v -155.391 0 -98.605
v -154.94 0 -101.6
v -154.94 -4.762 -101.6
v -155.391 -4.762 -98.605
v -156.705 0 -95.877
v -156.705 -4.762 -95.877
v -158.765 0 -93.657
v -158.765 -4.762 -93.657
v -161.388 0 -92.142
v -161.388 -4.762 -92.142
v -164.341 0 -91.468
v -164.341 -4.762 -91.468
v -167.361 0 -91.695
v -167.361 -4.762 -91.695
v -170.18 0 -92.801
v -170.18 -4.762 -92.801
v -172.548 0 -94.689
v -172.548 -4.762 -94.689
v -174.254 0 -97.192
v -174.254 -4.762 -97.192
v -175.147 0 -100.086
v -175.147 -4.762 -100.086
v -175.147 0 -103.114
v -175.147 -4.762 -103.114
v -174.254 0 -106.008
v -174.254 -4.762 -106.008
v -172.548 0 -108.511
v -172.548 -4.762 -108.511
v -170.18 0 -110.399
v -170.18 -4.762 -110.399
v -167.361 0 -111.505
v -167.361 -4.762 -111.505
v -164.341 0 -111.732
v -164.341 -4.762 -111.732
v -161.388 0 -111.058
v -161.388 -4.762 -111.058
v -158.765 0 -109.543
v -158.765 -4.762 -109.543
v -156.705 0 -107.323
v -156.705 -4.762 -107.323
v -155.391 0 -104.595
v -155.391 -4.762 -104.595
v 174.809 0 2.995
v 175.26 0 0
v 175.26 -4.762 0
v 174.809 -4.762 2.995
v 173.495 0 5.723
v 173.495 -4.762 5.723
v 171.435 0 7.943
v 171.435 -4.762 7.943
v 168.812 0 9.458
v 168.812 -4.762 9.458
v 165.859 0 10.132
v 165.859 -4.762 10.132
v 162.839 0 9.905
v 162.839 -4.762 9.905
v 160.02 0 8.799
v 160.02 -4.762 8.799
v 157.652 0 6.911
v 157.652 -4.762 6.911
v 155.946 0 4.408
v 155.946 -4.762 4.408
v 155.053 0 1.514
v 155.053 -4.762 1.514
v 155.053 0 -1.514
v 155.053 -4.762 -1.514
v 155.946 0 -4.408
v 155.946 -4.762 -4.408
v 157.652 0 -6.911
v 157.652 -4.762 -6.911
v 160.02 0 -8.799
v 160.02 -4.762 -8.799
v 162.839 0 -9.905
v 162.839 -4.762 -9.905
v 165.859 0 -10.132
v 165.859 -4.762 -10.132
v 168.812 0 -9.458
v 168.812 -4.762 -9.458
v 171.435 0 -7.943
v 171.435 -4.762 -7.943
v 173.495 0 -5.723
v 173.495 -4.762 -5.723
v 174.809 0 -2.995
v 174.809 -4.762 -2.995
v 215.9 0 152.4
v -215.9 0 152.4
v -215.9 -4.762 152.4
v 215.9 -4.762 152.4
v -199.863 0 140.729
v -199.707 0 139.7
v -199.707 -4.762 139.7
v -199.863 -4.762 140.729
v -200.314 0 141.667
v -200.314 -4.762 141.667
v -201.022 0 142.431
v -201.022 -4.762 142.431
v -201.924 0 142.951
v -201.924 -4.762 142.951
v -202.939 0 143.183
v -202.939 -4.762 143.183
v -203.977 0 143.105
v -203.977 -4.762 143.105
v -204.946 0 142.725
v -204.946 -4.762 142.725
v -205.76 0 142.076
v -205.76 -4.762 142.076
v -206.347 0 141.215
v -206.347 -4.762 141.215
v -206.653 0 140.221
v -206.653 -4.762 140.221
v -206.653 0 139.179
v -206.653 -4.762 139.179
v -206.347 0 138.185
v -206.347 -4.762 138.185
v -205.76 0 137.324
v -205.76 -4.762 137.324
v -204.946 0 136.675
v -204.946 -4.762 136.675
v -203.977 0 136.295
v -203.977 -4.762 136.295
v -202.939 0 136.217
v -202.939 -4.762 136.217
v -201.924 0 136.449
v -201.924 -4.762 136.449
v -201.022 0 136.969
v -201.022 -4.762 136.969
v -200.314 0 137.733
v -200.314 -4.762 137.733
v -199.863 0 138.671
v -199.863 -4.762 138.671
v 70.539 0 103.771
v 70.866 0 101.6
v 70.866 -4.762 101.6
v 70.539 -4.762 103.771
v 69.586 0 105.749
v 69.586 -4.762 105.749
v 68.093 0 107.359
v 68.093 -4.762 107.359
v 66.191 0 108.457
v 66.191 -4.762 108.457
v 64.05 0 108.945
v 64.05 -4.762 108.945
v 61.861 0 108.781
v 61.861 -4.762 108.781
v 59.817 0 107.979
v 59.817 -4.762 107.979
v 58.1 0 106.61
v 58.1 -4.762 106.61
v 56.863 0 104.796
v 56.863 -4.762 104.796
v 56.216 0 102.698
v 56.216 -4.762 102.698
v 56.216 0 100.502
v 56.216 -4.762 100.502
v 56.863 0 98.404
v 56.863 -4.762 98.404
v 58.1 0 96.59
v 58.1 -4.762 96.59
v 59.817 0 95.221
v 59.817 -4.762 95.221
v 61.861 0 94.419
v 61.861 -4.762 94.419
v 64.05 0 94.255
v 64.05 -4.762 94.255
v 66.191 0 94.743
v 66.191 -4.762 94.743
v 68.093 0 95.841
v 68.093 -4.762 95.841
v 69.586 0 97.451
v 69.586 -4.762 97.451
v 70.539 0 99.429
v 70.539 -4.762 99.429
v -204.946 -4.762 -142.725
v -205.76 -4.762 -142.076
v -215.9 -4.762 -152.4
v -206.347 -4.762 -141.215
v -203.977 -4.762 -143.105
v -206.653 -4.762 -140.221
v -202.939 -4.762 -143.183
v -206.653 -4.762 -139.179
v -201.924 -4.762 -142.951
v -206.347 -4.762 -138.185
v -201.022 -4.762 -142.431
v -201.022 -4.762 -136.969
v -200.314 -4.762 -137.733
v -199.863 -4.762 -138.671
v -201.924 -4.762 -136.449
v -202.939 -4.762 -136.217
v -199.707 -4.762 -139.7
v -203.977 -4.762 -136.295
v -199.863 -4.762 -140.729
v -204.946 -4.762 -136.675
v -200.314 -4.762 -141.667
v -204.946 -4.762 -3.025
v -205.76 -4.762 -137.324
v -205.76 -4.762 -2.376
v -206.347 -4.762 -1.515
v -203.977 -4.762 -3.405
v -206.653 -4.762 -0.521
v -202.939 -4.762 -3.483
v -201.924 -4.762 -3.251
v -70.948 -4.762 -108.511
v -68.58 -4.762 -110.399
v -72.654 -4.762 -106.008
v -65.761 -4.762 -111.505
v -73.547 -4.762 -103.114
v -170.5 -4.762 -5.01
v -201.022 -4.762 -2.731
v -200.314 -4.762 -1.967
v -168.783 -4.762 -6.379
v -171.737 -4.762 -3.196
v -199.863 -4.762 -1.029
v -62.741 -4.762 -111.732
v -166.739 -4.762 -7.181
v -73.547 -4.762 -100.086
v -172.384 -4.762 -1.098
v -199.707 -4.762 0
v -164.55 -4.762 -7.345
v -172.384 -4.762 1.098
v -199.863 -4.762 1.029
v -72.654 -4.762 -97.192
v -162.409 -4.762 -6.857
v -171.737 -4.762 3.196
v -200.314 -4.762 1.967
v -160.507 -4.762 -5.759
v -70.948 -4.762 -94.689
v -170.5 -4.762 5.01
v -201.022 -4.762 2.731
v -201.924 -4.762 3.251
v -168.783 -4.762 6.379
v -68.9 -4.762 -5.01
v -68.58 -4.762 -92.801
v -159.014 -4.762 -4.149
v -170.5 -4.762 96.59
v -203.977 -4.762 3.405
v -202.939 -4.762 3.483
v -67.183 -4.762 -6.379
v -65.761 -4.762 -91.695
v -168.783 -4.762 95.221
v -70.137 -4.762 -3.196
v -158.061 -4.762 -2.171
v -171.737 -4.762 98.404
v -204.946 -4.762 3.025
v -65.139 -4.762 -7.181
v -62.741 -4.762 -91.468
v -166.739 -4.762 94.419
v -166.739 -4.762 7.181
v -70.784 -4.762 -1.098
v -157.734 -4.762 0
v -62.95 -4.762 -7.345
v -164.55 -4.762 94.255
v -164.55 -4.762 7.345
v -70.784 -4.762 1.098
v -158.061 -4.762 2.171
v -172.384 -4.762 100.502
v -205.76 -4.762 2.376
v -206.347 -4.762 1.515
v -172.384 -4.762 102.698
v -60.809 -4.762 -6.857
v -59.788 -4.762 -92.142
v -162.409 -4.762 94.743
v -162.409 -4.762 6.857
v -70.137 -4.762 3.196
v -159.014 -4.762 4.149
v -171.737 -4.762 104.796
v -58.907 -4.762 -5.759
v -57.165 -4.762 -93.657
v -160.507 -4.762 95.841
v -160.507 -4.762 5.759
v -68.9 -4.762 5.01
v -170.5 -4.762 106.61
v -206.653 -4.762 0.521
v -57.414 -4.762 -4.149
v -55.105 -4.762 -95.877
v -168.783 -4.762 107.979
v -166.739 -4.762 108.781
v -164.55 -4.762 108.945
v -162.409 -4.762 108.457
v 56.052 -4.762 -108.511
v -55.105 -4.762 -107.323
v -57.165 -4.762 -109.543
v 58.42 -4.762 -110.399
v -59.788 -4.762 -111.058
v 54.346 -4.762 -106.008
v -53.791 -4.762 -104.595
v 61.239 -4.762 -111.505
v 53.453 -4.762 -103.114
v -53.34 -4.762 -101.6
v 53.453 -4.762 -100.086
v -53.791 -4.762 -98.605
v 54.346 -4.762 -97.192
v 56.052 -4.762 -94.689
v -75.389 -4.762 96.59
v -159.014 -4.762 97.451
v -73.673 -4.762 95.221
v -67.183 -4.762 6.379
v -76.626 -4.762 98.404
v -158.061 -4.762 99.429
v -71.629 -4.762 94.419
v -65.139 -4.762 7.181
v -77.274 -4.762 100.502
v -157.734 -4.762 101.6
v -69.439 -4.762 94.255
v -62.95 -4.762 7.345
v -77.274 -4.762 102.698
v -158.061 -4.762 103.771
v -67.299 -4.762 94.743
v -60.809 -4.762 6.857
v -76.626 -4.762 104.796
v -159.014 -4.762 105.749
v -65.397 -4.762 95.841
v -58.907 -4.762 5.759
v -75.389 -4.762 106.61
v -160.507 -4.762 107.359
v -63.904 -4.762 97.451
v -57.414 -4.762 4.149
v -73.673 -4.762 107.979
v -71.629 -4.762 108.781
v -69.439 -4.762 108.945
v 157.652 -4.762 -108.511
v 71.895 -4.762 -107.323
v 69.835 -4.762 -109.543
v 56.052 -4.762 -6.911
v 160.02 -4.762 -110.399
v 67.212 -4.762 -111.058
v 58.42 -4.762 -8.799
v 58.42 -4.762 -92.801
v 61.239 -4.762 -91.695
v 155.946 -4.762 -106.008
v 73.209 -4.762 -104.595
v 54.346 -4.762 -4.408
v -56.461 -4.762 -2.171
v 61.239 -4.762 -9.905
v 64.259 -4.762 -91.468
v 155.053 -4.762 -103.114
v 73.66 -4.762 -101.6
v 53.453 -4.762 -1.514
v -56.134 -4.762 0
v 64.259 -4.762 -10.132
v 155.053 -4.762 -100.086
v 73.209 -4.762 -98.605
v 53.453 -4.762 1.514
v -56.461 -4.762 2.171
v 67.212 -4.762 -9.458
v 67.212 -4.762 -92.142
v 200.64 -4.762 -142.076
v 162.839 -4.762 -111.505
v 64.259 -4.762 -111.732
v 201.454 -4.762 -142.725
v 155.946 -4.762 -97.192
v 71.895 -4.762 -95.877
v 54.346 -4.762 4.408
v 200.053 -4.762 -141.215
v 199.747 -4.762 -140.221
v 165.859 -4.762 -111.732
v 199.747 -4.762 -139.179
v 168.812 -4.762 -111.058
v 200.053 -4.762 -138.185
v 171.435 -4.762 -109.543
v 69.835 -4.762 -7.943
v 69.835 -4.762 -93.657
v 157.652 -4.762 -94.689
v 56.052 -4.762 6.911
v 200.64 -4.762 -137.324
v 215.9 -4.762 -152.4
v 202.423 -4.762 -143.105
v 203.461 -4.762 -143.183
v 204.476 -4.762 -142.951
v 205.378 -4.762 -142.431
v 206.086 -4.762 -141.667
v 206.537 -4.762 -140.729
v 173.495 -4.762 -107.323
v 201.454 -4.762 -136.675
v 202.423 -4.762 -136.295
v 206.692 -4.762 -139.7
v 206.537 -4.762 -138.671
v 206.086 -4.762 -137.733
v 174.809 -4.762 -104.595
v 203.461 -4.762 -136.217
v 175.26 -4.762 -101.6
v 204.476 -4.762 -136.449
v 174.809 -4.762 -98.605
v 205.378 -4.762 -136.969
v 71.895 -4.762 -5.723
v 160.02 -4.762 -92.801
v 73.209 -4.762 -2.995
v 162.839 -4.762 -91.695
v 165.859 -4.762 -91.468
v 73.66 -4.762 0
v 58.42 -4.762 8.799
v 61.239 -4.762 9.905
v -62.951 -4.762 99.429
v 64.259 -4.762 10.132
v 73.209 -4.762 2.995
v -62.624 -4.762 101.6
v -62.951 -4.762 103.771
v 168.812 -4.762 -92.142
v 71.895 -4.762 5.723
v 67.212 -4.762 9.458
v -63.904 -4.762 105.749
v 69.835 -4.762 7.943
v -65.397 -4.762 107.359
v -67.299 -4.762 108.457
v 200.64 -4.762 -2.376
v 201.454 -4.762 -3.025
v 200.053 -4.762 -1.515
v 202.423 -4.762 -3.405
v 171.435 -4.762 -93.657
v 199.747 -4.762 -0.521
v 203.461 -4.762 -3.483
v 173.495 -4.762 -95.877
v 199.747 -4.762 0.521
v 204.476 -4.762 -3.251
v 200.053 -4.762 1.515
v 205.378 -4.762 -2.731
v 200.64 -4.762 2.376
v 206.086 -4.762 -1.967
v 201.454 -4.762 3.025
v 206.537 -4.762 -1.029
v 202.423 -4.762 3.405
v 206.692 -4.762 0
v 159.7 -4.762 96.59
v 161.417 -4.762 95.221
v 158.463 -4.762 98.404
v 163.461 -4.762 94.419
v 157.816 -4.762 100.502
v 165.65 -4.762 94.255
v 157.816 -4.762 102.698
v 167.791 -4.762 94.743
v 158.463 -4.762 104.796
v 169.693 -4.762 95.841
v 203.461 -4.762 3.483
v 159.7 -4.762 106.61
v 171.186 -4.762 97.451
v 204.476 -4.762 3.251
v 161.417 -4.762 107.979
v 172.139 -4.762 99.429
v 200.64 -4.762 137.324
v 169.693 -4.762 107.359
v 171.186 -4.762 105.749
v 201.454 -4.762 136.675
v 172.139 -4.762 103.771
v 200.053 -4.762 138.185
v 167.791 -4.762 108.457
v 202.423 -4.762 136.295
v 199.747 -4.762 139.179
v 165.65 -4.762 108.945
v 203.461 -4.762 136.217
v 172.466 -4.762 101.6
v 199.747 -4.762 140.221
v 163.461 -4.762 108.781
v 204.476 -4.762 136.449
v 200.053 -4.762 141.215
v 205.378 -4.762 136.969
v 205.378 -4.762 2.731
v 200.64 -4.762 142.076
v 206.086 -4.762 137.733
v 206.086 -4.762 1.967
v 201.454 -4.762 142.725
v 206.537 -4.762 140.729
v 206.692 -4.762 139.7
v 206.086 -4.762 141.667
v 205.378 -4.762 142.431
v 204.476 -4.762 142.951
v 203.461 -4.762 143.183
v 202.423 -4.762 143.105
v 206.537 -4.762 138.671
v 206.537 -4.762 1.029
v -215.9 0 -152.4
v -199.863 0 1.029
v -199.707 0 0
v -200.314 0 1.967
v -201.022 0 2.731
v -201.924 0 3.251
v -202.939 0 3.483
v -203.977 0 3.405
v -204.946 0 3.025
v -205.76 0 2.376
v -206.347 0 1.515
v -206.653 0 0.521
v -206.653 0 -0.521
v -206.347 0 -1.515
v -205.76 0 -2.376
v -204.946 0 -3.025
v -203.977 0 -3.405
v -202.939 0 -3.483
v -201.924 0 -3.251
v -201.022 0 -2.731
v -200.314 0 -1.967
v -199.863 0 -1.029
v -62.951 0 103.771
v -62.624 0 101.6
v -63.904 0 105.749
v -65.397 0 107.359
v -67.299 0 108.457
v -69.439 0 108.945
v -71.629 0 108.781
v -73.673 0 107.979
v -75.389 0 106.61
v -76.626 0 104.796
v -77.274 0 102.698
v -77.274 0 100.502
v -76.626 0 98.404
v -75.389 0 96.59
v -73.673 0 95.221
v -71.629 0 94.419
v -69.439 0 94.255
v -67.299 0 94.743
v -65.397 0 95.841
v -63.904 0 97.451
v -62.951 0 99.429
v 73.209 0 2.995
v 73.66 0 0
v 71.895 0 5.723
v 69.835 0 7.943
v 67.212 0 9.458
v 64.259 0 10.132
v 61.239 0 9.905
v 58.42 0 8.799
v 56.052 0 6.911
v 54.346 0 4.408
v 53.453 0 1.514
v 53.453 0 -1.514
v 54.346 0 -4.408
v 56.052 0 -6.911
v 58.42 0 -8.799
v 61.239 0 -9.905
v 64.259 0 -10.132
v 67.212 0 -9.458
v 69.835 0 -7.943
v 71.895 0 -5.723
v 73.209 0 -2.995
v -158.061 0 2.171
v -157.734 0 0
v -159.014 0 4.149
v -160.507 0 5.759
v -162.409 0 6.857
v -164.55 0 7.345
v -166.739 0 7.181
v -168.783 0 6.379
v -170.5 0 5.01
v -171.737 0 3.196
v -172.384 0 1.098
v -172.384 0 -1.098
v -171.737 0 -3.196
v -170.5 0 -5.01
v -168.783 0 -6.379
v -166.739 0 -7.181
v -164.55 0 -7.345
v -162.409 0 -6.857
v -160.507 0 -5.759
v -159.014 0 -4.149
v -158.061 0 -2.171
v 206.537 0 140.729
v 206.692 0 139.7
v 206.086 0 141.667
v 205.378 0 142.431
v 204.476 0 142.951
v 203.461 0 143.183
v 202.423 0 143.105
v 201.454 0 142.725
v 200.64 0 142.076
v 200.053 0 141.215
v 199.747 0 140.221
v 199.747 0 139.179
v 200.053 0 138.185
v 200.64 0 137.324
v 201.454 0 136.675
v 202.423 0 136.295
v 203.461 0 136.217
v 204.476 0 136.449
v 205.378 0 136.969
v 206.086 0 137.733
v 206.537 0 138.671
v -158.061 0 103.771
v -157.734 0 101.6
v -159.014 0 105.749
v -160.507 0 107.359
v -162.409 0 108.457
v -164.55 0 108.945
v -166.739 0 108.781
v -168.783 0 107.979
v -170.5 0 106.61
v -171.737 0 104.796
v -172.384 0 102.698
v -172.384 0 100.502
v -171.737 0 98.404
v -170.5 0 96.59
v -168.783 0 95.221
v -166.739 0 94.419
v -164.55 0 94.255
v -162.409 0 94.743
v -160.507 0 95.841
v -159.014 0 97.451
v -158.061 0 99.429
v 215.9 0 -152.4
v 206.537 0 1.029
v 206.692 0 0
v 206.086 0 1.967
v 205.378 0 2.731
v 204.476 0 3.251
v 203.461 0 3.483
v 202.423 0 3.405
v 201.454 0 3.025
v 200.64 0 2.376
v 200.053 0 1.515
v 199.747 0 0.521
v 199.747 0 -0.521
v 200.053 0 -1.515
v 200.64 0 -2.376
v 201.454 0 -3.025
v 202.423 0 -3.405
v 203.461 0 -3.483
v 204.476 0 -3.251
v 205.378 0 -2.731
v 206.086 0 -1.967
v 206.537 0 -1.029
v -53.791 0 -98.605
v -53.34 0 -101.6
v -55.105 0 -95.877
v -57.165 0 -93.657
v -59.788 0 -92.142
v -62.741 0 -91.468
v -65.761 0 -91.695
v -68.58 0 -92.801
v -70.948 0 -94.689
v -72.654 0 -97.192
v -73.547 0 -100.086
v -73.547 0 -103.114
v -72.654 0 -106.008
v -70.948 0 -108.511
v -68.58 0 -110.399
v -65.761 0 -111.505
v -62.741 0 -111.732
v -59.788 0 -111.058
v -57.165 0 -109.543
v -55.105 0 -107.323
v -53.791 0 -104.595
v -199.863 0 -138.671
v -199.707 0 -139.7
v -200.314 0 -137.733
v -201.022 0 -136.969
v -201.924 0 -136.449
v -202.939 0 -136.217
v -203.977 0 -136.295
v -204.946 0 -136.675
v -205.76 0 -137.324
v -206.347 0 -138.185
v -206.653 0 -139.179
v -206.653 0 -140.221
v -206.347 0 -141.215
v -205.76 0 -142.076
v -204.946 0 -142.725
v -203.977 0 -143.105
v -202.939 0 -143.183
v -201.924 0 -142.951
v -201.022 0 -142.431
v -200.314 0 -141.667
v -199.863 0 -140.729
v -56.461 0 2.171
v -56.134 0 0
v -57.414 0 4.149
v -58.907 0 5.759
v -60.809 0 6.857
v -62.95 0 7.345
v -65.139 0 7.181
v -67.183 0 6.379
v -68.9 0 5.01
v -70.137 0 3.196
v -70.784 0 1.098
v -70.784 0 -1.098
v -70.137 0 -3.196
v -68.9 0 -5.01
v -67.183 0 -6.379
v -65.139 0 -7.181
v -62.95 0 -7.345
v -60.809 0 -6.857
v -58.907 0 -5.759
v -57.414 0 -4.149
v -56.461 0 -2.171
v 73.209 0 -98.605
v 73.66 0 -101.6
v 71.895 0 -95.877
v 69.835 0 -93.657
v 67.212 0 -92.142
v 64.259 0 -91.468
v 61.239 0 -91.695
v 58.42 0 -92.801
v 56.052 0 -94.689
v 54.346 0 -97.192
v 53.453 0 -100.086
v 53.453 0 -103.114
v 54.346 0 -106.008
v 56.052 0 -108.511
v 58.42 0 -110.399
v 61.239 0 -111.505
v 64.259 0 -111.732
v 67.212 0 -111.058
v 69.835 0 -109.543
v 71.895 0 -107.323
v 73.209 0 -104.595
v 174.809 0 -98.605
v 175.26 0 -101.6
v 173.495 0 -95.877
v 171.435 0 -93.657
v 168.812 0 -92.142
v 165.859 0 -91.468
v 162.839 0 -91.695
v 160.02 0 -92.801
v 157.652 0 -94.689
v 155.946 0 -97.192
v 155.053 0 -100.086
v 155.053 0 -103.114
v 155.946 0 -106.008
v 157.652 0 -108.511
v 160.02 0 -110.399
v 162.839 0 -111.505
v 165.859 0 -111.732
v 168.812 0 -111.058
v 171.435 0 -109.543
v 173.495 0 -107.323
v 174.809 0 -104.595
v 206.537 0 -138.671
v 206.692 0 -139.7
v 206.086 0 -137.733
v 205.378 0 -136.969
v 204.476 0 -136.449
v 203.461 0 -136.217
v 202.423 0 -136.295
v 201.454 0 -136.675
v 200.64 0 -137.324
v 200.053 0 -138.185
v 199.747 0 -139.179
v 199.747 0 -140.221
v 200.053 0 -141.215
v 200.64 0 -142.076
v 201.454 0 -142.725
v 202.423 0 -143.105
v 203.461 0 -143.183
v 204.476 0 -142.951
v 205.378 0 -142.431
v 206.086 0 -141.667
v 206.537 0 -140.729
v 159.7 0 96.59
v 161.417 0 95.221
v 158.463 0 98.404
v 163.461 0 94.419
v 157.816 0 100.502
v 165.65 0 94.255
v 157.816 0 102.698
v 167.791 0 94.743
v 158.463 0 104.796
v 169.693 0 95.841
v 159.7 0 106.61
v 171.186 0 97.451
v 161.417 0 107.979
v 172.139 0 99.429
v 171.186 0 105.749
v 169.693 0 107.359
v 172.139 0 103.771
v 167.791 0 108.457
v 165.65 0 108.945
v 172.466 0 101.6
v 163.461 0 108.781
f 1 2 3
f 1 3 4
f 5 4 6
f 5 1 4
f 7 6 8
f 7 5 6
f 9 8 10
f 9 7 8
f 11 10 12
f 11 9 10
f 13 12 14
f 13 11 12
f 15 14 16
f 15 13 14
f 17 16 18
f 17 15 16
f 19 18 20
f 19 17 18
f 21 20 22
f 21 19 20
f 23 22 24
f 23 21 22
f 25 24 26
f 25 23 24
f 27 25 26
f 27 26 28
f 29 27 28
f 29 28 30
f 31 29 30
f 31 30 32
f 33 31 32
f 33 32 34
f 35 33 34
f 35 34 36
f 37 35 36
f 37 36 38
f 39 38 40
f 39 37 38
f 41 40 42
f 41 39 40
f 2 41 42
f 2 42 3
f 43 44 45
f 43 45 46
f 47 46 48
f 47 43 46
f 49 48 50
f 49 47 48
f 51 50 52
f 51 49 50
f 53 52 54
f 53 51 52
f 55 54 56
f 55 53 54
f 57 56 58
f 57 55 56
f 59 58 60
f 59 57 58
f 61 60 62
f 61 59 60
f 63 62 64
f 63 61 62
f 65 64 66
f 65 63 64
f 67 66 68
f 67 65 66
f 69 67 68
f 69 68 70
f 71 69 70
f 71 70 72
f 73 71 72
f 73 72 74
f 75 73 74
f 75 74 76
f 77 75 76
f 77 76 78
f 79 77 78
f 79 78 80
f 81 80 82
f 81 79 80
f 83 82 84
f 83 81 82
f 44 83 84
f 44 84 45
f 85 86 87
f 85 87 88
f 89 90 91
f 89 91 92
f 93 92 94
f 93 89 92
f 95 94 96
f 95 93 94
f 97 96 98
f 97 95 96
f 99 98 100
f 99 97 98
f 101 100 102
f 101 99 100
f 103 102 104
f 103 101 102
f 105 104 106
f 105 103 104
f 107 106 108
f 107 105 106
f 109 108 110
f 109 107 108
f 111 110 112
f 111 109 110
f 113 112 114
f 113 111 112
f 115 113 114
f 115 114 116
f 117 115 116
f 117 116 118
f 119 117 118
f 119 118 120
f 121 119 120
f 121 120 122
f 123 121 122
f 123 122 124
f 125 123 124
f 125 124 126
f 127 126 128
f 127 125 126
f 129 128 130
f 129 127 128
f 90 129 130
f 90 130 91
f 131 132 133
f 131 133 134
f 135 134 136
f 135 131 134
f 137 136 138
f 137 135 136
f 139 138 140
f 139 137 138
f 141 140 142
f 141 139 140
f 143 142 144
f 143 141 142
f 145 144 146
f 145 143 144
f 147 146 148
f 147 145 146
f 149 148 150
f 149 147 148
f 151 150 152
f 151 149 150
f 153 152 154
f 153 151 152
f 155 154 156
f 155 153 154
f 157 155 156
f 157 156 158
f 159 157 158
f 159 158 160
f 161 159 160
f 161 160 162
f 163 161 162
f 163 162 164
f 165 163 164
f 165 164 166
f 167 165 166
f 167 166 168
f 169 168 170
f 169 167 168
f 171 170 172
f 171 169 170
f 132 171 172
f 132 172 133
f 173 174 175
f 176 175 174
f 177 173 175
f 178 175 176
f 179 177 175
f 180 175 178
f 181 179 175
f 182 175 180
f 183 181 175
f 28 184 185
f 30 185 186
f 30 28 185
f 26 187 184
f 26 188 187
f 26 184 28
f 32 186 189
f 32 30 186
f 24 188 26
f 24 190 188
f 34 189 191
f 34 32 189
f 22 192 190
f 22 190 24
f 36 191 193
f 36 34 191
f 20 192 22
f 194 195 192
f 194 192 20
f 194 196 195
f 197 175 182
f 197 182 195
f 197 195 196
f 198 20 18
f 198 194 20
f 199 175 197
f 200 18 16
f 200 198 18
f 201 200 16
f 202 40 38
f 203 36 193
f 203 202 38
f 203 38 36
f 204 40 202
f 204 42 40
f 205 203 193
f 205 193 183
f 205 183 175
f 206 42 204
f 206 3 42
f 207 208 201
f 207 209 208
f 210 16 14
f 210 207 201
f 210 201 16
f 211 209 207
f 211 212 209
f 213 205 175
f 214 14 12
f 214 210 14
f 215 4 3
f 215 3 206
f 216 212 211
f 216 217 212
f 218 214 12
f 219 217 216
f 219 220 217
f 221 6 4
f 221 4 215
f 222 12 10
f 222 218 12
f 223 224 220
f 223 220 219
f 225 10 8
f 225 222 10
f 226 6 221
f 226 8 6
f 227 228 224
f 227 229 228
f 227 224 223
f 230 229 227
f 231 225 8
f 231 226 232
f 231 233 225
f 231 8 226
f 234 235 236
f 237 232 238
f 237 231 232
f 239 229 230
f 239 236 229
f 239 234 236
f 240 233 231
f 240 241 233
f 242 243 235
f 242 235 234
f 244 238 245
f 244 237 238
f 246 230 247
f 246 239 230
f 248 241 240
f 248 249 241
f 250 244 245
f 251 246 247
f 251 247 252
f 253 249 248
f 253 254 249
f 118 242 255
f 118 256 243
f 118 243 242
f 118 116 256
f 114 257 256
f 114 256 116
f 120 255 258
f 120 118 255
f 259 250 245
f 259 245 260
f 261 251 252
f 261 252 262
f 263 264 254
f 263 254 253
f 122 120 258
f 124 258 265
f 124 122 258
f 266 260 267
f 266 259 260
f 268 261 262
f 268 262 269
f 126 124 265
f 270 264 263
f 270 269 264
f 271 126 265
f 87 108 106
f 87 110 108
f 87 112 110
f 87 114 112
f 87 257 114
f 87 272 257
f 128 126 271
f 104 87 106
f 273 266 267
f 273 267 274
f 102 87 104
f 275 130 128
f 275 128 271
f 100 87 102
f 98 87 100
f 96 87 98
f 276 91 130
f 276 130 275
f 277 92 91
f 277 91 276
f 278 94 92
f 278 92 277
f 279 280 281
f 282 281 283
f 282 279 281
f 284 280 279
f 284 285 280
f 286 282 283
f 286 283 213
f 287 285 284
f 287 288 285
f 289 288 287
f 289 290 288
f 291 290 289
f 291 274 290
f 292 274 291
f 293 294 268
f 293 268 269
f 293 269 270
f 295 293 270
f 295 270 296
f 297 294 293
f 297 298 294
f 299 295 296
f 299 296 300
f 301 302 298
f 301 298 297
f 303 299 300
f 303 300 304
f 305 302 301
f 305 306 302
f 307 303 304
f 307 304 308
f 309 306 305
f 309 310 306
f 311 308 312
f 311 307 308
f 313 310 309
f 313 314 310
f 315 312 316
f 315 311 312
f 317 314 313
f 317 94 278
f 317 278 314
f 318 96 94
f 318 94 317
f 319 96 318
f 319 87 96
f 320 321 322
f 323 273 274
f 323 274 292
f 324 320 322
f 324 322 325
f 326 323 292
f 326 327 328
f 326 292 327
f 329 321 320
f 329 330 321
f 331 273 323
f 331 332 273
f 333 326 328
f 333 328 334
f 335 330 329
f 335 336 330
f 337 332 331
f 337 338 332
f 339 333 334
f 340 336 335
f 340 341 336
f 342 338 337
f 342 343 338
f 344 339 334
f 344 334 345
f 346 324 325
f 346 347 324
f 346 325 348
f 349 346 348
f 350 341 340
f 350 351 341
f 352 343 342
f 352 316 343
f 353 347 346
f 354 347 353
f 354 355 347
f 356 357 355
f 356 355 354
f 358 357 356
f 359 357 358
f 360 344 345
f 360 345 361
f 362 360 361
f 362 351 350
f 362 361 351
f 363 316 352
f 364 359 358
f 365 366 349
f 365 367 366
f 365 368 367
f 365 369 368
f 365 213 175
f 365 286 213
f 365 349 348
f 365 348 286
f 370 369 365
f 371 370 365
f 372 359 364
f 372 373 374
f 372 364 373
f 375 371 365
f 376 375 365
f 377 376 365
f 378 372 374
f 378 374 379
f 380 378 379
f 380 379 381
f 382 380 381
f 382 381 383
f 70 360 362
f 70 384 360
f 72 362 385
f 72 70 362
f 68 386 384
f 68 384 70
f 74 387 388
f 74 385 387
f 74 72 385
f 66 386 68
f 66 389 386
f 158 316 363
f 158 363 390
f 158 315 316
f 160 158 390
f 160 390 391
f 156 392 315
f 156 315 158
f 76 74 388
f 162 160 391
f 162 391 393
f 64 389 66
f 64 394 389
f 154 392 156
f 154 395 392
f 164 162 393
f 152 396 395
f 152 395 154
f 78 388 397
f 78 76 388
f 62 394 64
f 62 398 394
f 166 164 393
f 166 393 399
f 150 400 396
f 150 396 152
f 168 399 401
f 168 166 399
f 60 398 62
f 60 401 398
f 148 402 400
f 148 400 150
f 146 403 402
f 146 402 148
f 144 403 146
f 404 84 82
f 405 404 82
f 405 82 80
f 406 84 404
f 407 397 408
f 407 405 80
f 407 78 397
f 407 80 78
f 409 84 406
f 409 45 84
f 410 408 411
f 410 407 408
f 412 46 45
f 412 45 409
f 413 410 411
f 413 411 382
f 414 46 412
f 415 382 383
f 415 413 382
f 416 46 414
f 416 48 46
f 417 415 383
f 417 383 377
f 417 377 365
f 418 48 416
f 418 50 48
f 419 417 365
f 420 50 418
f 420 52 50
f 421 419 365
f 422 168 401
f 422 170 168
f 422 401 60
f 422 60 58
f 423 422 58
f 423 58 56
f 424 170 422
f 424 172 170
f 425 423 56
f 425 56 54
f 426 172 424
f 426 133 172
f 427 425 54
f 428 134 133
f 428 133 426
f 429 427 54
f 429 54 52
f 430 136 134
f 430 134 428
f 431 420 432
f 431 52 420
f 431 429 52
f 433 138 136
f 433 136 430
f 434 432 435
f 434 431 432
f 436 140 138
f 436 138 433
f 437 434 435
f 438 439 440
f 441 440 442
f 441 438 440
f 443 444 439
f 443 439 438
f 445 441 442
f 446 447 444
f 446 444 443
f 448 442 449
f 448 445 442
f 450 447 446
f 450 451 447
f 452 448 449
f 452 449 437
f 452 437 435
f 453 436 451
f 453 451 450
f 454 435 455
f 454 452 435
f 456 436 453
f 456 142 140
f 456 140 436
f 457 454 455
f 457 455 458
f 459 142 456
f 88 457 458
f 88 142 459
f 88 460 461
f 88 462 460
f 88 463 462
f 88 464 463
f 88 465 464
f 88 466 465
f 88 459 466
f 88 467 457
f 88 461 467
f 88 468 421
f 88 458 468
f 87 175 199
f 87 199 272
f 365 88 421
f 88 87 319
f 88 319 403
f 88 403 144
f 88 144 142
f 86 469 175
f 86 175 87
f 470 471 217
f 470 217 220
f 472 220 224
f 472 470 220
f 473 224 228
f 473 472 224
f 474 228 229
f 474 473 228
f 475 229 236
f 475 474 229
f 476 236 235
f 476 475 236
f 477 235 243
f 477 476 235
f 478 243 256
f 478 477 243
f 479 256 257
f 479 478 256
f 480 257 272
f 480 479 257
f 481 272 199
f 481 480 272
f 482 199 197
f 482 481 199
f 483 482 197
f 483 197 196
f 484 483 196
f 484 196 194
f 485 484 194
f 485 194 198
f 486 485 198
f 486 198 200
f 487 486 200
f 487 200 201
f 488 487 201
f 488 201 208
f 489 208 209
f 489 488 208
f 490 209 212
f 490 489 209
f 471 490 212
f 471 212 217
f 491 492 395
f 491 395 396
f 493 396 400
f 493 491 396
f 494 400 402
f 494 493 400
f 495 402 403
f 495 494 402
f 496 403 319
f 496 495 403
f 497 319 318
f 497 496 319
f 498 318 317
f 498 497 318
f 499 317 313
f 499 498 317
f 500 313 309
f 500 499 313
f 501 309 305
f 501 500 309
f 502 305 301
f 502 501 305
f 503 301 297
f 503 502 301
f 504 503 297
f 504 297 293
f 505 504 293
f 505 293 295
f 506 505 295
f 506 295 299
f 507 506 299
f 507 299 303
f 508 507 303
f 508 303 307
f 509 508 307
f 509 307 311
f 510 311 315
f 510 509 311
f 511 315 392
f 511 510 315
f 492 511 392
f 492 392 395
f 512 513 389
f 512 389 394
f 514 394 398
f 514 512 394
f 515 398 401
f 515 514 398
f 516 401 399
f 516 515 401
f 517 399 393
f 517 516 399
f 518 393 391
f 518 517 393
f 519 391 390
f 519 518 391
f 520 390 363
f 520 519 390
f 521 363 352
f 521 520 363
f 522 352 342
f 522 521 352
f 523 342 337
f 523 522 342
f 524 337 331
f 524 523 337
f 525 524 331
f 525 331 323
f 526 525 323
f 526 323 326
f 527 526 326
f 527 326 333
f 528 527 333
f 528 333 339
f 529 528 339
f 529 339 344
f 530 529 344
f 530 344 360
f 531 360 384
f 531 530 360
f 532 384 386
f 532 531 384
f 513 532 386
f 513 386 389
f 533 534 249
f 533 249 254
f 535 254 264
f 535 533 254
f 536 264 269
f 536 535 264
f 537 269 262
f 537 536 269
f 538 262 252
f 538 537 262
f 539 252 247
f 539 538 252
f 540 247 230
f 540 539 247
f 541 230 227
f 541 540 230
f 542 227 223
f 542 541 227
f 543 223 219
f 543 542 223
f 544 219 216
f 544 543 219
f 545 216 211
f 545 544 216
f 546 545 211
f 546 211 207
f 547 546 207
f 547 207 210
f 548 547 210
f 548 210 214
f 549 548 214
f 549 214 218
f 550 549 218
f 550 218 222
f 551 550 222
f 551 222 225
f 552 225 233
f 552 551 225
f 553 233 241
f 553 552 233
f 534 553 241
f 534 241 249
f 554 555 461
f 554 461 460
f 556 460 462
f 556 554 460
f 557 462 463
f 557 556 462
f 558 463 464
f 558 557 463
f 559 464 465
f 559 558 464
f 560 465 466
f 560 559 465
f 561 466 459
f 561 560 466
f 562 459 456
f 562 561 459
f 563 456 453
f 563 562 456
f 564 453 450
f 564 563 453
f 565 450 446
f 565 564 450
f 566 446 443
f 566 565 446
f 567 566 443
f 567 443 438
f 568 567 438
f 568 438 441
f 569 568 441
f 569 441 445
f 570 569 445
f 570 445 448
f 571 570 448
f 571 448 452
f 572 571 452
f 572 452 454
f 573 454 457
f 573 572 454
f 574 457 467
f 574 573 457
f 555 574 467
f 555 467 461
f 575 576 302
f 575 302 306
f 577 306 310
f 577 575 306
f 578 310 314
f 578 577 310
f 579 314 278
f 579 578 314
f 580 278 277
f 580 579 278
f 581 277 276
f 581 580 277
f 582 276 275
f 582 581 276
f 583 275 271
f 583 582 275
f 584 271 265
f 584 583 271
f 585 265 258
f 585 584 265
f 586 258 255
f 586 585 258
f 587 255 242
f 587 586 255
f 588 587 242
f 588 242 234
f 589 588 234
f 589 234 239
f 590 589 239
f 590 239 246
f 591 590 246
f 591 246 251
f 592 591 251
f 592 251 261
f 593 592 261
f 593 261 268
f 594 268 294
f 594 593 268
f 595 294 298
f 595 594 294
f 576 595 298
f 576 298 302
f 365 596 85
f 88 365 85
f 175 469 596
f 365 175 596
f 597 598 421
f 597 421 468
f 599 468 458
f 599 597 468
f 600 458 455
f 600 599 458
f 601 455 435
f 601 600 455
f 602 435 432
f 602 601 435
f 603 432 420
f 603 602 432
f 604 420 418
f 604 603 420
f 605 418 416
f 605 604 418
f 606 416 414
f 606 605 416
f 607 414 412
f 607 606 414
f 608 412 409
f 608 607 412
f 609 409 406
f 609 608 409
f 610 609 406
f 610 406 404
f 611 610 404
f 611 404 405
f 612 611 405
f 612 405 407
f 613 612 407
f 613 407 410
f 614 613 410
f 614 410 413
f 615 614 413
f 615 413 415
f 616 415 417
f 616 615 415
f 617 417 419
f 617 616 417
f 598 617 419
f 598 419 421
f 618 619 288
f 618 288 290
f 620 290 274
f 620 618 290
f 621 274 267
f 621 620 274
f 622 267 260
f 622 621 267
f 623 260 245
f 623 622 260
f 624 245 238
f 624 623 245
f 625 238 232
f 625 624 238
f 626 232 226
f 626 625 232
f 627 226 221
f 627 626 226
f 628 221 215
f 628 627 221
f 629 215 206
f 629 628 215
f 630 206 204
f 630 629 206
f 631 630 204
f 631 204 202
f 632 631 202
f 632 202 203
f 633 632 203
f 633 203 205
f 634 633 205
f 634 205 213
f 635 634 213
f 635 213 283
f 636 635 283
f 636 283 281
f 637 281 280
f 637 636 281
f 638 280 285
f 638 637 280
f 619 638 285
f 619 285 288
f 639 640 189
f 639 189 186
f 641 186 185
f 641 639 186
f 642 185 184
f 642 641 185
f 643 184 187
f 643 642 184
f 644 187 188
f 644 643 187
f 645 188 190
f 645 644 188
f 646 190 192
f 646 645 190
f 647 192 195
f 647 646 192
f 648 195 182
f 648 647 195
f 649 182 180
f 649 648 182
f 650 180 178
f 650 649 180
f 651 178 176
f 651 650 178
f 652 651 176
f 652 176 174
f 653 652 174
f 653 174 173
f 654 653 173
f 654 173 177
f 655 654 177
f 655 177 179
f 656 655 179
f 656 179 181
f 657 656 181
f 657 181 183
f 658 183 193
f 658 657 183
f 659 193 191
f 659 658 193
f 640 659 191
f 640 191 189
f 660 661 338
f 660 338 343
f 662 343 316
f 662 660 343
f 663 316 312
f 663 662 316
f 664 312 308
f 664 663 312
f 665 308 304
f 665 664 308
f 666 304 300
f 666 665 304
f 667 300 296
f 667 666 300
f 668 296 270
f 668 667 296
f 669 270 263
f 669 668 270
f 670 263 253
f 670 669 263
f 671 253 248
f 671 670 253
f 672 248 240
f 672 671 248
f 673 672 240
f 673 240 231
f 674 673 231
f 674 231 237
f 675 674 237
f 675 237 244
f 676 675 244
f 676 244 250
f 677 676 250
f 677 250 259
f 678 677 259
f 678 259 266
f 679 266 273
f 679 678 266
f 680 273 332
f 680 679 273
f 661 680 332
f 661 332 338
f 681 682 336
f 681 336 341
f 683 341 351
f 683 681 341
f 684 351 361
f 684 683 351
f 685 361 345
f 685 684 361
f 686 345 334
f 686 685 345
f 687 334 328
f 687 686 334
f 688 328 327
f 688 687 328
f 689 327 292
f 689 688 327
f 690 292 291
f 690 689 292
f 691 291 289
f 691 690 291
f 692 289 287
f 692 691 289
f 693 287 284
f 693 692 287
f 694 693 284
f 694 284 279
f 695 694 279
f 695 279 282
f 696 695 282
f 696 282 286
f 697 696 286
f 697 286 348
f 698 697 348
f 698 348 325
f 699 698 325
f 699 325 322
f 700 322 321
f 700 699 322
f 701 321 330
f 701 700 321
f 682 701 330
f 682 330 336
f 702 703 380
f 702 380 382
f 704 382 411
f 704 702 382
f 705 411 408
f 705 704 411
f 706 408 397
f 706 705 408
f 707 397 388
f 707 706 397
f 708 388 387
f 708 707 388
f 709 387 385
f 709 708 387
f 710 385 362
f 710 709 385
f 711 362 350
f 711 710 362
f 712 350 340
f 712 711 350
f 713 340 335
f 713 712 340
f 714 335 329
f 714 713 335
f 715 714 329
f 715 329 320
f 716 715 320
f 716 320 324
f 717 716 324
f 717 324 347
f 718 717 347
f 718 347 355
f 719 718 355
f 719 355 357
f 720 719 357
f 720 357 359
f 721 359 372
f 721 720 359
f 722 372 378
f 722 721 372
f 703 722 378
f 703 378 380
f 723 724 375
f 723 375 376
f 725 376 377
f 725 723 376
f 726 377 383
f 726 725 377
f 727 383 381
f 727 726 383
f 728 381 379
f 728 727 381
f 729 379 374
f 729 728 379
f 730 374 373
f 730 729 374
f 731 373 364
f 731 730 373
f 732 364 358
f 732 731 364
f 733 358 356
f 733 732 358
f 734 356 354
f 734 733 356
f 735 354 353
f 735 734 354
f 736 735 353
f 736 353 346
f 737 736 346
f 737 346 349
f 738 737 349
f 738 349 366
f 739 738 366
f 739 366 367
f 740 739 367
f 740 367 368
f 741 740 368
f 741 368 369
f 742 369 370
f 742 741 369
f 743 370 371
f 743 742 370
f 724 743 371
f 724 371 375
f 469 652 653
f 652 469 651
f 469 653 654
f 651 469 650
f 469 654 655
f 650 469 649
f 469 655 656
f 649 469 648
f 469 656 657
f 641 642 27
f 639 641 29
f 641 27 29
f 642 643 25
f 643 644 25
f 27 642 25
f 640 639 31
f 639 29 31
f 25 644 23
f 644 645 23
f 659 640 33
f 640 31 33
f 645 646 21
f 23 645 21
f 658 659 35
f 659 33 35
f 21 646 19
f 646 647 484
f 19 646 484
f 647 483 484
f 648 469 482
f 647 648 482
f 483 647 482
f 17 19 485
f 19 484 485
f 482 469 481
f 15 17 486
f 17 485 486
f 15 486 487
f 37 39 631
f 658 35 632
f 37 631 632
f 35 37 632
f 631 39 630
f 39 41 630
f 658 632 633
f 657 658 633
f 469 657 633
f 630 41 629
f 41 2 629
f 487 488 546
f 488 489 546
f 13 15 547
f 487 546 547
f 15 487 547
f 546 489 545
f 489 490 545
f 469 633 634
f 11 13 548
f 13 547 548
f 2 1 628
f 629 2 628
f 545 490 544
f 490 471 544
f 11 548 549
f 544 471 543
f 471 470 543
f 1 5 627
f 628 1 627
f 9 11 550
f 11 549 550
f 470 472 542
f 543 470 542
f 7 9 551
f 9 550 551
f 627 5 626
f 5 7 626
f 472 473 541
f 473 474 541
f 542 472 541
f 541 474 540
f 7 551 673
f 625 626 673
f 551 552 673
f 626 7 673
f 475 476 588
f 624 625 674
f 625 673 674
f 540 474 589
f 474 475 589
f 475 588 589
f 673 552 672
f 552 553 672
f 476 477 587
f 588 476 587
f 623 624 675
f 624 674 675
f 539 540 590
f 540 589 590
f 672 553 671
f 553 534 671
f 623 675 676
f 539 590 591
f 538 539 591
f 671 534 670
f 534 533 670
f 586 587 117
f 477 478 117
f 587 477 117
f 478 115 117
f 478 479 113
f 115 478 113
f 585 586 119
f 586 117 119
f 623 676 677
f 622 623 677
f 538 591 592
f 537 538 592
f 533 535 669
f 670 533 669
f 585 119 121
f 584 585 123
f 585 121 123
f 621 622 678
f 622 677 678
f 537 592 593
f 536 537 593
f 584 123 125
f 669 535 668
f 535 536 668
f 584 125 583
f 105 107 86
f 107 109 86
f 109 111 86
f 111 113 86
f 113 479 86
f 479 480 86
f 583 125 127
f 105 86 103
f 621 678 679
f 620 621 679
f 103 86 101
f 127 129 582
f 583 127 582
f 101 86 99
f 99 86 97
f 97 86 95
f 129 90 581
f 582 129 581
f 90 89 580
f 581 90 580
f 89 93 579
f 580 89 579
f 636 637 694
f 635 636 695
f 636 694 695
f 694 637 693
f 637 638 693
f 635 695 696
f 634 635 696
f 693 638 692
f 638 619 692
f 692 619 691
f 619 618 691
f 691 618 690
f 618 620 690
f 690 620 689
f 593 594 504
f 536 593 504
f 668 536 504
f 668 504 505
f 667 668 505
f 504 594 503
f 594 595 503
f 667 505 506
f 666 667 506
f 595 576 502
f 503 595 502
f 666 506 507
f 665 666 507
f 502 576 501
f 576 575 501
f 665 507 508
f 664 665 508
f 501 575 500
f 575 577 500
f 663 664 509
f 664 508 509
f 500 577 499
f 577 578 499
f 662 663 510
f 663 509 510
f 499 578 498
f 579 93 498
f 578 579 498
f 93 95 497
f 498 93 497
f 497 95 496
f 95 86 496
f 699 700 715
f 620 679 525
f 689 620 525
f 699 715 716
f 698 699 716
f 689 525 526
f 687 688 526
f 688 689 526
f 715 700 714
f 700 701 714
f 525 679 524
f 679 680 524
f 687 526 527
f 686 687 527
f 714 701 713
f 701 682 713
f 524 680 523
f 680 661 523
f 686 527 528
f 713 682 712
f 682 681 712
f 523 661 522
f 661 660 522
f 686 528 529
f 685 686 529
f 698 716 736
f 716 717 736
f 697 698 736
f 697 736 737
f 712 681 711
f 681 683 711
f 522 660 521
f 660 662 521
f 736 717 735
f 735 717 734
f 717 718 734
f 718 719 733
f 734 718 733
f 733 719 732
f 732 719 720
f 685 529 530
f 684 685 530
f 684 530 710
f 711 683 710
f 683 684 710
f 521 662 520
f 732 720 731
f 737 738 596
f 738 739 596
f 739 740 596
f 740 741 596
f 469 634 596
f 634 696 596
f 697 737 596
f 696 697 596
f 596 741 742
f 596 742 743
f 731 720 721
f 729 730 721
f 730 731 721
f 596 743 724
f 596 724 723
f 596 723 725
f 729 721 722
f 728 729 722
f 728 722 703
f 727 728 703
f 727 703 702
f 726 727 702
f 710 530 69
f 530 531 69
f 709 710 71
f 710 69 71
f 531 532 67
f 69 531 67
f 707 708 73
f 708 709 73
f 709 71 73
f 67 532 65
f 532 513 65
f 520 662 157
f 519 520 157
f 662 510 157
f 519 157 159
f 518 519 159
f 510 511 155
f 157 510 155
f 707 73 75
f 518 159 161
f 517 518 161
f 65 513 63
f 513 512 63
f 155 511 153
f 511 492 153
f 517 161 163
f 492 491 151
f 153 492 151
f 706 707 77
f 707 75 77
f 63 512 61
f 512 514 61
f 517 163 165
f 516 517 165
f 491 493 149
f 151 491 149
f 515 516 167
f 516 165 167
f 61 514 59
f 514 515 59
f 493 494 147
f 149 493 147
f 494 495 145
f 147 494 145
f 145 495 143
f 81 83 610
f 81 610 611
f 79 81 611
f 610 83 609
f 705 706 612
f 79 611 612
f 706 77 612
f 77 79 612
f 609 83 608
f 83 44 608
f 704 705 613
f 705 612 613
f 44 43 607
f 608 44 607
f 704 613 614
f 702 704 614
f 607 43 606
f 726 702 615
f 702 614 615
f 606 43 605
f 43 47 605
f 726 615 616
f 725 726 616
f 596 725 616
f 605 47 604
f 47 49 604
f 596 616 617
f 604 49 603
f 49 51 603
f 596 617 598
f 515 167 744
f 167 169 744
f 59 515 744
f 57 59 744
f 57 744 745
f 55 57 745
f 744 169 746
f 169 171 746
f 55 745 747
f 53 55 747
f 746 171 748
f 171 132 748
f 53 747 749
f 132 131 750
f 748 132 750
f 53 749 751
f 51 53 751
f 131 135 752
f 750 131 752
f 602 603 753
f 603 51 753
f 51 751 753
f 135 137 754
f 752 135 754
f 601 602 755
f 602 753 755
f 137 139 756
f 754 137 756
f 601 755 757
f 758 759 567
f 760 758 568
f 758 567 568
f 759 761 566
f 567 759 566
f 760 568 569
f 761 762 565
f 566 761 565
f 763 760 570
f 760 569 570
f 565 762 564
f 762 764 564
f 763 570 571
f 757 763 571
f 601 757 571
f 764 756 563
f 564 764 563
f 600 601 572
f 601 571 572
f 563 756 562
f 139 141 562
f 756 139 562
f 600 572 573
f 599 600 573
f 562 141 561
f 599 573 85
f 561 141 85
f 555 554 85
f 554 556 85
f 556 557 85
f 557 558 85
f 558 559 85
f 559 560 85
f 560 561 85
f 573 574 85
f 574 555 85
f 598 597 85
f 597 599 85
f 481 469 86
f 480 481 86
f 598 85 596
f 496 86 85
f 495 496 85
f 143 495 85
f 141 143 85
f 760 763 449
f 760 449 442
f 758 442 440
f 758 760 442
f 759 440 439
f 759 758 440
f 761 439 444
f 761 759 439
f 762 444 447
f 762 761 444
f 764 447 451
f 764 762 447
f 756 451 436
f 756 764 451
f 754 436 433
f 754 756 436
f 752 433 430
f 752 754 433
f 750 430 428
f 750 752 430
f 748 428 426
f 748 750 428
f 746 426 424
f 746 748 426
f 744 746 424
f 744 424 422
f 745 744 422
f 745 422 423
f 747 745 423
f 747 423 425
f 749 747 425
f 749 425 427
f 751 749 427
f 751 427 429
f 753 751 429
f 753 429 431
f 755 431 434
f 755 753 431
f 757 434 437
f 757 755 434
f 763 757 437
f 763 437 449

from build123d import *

# Parameters (mm, degrees)
F0_W     = 431.8
F0_H     = 304.8
F0_R     = 3.4925
F0_R_2   = 10.16
F0_R_3   = 7.366
F1_DEPTH = 4.7625


with BuildPart() as f1:
    # F0 (on Front) → F1 (new body)
    with BuildSketch(Plane.XZ):
        Rectangle(F0_W, F0_H)
        with Locations((-203.2, -139.7)):
            Circle(F0_R, mode=Mode.SUBTRACT)
        with Locations((-165.1, -101.6)):
            Circle(F0_R_2, mode=Mode.SUBTRACT)
        with Locations((-63.5, -101.6)):
            Circle(F0_R_2, mode=Mode.SUBTRACT)
        with Locations((63.5, -101.6)):
            Circle(F0_R_2, mode=Mode.SUBTRACT)
        with Locations((203.2, -139.7)):
            Circle(F0_R, mode=Mode.SUBTRACT)
        with Locations((165.1, -101.6)):
            Circle(F0_R_2, mode=Mode.SUBTRACT)
        with Locations((-203.2, 0)):
            Circle(F0_R, mode=Mode.SUBTRACT)
        with Locations((-165.1, 0)):
            Circle(F0_R_3, mode=Mode.SUBTRACT)
        with Locations((-63.5, 0)):
            Circle(F0_R_3, mode=Mode.SUBTRACT)
        with Locations((-165.1, 101.6)):
            Circle(F0_R_3, mode=Mode.SUBTRACT)
        with Locations((-203.2, 139.7)):
            Circle(F0_R, mode=Mode.SUBTRACT)
        with Locations((-69.9898, 101.6)):
            Circle(F0_R_3, mode=Mode.SUBTRACT)
        with Locations((63.5, 0)):
            Circle(F0_R_2, mode=Mode.SUBTRACT)
        with Locations((165.1, 0)):
            Circle(F0_R_2, mode=Mode.SUBTRACT)
        with Locations((203.2, 0)):
            Circle(F0_R, mode=Mode.SUBTRACT)
        with Locations((63.5, 101.6)):
            Circle(F0_R_3, mode=Mode.SUBTRACT)
        with Locations((165.1, 101.6)):
            Circle(F0_R_3, mode=Mode.SUBTRACT)
        with Locations((203.2, 139.7)):
            Circle(F0_R, mode=Mode.SUBTRACT)
    extrude(amount=F1_DEPTH)


solid = f1.part
